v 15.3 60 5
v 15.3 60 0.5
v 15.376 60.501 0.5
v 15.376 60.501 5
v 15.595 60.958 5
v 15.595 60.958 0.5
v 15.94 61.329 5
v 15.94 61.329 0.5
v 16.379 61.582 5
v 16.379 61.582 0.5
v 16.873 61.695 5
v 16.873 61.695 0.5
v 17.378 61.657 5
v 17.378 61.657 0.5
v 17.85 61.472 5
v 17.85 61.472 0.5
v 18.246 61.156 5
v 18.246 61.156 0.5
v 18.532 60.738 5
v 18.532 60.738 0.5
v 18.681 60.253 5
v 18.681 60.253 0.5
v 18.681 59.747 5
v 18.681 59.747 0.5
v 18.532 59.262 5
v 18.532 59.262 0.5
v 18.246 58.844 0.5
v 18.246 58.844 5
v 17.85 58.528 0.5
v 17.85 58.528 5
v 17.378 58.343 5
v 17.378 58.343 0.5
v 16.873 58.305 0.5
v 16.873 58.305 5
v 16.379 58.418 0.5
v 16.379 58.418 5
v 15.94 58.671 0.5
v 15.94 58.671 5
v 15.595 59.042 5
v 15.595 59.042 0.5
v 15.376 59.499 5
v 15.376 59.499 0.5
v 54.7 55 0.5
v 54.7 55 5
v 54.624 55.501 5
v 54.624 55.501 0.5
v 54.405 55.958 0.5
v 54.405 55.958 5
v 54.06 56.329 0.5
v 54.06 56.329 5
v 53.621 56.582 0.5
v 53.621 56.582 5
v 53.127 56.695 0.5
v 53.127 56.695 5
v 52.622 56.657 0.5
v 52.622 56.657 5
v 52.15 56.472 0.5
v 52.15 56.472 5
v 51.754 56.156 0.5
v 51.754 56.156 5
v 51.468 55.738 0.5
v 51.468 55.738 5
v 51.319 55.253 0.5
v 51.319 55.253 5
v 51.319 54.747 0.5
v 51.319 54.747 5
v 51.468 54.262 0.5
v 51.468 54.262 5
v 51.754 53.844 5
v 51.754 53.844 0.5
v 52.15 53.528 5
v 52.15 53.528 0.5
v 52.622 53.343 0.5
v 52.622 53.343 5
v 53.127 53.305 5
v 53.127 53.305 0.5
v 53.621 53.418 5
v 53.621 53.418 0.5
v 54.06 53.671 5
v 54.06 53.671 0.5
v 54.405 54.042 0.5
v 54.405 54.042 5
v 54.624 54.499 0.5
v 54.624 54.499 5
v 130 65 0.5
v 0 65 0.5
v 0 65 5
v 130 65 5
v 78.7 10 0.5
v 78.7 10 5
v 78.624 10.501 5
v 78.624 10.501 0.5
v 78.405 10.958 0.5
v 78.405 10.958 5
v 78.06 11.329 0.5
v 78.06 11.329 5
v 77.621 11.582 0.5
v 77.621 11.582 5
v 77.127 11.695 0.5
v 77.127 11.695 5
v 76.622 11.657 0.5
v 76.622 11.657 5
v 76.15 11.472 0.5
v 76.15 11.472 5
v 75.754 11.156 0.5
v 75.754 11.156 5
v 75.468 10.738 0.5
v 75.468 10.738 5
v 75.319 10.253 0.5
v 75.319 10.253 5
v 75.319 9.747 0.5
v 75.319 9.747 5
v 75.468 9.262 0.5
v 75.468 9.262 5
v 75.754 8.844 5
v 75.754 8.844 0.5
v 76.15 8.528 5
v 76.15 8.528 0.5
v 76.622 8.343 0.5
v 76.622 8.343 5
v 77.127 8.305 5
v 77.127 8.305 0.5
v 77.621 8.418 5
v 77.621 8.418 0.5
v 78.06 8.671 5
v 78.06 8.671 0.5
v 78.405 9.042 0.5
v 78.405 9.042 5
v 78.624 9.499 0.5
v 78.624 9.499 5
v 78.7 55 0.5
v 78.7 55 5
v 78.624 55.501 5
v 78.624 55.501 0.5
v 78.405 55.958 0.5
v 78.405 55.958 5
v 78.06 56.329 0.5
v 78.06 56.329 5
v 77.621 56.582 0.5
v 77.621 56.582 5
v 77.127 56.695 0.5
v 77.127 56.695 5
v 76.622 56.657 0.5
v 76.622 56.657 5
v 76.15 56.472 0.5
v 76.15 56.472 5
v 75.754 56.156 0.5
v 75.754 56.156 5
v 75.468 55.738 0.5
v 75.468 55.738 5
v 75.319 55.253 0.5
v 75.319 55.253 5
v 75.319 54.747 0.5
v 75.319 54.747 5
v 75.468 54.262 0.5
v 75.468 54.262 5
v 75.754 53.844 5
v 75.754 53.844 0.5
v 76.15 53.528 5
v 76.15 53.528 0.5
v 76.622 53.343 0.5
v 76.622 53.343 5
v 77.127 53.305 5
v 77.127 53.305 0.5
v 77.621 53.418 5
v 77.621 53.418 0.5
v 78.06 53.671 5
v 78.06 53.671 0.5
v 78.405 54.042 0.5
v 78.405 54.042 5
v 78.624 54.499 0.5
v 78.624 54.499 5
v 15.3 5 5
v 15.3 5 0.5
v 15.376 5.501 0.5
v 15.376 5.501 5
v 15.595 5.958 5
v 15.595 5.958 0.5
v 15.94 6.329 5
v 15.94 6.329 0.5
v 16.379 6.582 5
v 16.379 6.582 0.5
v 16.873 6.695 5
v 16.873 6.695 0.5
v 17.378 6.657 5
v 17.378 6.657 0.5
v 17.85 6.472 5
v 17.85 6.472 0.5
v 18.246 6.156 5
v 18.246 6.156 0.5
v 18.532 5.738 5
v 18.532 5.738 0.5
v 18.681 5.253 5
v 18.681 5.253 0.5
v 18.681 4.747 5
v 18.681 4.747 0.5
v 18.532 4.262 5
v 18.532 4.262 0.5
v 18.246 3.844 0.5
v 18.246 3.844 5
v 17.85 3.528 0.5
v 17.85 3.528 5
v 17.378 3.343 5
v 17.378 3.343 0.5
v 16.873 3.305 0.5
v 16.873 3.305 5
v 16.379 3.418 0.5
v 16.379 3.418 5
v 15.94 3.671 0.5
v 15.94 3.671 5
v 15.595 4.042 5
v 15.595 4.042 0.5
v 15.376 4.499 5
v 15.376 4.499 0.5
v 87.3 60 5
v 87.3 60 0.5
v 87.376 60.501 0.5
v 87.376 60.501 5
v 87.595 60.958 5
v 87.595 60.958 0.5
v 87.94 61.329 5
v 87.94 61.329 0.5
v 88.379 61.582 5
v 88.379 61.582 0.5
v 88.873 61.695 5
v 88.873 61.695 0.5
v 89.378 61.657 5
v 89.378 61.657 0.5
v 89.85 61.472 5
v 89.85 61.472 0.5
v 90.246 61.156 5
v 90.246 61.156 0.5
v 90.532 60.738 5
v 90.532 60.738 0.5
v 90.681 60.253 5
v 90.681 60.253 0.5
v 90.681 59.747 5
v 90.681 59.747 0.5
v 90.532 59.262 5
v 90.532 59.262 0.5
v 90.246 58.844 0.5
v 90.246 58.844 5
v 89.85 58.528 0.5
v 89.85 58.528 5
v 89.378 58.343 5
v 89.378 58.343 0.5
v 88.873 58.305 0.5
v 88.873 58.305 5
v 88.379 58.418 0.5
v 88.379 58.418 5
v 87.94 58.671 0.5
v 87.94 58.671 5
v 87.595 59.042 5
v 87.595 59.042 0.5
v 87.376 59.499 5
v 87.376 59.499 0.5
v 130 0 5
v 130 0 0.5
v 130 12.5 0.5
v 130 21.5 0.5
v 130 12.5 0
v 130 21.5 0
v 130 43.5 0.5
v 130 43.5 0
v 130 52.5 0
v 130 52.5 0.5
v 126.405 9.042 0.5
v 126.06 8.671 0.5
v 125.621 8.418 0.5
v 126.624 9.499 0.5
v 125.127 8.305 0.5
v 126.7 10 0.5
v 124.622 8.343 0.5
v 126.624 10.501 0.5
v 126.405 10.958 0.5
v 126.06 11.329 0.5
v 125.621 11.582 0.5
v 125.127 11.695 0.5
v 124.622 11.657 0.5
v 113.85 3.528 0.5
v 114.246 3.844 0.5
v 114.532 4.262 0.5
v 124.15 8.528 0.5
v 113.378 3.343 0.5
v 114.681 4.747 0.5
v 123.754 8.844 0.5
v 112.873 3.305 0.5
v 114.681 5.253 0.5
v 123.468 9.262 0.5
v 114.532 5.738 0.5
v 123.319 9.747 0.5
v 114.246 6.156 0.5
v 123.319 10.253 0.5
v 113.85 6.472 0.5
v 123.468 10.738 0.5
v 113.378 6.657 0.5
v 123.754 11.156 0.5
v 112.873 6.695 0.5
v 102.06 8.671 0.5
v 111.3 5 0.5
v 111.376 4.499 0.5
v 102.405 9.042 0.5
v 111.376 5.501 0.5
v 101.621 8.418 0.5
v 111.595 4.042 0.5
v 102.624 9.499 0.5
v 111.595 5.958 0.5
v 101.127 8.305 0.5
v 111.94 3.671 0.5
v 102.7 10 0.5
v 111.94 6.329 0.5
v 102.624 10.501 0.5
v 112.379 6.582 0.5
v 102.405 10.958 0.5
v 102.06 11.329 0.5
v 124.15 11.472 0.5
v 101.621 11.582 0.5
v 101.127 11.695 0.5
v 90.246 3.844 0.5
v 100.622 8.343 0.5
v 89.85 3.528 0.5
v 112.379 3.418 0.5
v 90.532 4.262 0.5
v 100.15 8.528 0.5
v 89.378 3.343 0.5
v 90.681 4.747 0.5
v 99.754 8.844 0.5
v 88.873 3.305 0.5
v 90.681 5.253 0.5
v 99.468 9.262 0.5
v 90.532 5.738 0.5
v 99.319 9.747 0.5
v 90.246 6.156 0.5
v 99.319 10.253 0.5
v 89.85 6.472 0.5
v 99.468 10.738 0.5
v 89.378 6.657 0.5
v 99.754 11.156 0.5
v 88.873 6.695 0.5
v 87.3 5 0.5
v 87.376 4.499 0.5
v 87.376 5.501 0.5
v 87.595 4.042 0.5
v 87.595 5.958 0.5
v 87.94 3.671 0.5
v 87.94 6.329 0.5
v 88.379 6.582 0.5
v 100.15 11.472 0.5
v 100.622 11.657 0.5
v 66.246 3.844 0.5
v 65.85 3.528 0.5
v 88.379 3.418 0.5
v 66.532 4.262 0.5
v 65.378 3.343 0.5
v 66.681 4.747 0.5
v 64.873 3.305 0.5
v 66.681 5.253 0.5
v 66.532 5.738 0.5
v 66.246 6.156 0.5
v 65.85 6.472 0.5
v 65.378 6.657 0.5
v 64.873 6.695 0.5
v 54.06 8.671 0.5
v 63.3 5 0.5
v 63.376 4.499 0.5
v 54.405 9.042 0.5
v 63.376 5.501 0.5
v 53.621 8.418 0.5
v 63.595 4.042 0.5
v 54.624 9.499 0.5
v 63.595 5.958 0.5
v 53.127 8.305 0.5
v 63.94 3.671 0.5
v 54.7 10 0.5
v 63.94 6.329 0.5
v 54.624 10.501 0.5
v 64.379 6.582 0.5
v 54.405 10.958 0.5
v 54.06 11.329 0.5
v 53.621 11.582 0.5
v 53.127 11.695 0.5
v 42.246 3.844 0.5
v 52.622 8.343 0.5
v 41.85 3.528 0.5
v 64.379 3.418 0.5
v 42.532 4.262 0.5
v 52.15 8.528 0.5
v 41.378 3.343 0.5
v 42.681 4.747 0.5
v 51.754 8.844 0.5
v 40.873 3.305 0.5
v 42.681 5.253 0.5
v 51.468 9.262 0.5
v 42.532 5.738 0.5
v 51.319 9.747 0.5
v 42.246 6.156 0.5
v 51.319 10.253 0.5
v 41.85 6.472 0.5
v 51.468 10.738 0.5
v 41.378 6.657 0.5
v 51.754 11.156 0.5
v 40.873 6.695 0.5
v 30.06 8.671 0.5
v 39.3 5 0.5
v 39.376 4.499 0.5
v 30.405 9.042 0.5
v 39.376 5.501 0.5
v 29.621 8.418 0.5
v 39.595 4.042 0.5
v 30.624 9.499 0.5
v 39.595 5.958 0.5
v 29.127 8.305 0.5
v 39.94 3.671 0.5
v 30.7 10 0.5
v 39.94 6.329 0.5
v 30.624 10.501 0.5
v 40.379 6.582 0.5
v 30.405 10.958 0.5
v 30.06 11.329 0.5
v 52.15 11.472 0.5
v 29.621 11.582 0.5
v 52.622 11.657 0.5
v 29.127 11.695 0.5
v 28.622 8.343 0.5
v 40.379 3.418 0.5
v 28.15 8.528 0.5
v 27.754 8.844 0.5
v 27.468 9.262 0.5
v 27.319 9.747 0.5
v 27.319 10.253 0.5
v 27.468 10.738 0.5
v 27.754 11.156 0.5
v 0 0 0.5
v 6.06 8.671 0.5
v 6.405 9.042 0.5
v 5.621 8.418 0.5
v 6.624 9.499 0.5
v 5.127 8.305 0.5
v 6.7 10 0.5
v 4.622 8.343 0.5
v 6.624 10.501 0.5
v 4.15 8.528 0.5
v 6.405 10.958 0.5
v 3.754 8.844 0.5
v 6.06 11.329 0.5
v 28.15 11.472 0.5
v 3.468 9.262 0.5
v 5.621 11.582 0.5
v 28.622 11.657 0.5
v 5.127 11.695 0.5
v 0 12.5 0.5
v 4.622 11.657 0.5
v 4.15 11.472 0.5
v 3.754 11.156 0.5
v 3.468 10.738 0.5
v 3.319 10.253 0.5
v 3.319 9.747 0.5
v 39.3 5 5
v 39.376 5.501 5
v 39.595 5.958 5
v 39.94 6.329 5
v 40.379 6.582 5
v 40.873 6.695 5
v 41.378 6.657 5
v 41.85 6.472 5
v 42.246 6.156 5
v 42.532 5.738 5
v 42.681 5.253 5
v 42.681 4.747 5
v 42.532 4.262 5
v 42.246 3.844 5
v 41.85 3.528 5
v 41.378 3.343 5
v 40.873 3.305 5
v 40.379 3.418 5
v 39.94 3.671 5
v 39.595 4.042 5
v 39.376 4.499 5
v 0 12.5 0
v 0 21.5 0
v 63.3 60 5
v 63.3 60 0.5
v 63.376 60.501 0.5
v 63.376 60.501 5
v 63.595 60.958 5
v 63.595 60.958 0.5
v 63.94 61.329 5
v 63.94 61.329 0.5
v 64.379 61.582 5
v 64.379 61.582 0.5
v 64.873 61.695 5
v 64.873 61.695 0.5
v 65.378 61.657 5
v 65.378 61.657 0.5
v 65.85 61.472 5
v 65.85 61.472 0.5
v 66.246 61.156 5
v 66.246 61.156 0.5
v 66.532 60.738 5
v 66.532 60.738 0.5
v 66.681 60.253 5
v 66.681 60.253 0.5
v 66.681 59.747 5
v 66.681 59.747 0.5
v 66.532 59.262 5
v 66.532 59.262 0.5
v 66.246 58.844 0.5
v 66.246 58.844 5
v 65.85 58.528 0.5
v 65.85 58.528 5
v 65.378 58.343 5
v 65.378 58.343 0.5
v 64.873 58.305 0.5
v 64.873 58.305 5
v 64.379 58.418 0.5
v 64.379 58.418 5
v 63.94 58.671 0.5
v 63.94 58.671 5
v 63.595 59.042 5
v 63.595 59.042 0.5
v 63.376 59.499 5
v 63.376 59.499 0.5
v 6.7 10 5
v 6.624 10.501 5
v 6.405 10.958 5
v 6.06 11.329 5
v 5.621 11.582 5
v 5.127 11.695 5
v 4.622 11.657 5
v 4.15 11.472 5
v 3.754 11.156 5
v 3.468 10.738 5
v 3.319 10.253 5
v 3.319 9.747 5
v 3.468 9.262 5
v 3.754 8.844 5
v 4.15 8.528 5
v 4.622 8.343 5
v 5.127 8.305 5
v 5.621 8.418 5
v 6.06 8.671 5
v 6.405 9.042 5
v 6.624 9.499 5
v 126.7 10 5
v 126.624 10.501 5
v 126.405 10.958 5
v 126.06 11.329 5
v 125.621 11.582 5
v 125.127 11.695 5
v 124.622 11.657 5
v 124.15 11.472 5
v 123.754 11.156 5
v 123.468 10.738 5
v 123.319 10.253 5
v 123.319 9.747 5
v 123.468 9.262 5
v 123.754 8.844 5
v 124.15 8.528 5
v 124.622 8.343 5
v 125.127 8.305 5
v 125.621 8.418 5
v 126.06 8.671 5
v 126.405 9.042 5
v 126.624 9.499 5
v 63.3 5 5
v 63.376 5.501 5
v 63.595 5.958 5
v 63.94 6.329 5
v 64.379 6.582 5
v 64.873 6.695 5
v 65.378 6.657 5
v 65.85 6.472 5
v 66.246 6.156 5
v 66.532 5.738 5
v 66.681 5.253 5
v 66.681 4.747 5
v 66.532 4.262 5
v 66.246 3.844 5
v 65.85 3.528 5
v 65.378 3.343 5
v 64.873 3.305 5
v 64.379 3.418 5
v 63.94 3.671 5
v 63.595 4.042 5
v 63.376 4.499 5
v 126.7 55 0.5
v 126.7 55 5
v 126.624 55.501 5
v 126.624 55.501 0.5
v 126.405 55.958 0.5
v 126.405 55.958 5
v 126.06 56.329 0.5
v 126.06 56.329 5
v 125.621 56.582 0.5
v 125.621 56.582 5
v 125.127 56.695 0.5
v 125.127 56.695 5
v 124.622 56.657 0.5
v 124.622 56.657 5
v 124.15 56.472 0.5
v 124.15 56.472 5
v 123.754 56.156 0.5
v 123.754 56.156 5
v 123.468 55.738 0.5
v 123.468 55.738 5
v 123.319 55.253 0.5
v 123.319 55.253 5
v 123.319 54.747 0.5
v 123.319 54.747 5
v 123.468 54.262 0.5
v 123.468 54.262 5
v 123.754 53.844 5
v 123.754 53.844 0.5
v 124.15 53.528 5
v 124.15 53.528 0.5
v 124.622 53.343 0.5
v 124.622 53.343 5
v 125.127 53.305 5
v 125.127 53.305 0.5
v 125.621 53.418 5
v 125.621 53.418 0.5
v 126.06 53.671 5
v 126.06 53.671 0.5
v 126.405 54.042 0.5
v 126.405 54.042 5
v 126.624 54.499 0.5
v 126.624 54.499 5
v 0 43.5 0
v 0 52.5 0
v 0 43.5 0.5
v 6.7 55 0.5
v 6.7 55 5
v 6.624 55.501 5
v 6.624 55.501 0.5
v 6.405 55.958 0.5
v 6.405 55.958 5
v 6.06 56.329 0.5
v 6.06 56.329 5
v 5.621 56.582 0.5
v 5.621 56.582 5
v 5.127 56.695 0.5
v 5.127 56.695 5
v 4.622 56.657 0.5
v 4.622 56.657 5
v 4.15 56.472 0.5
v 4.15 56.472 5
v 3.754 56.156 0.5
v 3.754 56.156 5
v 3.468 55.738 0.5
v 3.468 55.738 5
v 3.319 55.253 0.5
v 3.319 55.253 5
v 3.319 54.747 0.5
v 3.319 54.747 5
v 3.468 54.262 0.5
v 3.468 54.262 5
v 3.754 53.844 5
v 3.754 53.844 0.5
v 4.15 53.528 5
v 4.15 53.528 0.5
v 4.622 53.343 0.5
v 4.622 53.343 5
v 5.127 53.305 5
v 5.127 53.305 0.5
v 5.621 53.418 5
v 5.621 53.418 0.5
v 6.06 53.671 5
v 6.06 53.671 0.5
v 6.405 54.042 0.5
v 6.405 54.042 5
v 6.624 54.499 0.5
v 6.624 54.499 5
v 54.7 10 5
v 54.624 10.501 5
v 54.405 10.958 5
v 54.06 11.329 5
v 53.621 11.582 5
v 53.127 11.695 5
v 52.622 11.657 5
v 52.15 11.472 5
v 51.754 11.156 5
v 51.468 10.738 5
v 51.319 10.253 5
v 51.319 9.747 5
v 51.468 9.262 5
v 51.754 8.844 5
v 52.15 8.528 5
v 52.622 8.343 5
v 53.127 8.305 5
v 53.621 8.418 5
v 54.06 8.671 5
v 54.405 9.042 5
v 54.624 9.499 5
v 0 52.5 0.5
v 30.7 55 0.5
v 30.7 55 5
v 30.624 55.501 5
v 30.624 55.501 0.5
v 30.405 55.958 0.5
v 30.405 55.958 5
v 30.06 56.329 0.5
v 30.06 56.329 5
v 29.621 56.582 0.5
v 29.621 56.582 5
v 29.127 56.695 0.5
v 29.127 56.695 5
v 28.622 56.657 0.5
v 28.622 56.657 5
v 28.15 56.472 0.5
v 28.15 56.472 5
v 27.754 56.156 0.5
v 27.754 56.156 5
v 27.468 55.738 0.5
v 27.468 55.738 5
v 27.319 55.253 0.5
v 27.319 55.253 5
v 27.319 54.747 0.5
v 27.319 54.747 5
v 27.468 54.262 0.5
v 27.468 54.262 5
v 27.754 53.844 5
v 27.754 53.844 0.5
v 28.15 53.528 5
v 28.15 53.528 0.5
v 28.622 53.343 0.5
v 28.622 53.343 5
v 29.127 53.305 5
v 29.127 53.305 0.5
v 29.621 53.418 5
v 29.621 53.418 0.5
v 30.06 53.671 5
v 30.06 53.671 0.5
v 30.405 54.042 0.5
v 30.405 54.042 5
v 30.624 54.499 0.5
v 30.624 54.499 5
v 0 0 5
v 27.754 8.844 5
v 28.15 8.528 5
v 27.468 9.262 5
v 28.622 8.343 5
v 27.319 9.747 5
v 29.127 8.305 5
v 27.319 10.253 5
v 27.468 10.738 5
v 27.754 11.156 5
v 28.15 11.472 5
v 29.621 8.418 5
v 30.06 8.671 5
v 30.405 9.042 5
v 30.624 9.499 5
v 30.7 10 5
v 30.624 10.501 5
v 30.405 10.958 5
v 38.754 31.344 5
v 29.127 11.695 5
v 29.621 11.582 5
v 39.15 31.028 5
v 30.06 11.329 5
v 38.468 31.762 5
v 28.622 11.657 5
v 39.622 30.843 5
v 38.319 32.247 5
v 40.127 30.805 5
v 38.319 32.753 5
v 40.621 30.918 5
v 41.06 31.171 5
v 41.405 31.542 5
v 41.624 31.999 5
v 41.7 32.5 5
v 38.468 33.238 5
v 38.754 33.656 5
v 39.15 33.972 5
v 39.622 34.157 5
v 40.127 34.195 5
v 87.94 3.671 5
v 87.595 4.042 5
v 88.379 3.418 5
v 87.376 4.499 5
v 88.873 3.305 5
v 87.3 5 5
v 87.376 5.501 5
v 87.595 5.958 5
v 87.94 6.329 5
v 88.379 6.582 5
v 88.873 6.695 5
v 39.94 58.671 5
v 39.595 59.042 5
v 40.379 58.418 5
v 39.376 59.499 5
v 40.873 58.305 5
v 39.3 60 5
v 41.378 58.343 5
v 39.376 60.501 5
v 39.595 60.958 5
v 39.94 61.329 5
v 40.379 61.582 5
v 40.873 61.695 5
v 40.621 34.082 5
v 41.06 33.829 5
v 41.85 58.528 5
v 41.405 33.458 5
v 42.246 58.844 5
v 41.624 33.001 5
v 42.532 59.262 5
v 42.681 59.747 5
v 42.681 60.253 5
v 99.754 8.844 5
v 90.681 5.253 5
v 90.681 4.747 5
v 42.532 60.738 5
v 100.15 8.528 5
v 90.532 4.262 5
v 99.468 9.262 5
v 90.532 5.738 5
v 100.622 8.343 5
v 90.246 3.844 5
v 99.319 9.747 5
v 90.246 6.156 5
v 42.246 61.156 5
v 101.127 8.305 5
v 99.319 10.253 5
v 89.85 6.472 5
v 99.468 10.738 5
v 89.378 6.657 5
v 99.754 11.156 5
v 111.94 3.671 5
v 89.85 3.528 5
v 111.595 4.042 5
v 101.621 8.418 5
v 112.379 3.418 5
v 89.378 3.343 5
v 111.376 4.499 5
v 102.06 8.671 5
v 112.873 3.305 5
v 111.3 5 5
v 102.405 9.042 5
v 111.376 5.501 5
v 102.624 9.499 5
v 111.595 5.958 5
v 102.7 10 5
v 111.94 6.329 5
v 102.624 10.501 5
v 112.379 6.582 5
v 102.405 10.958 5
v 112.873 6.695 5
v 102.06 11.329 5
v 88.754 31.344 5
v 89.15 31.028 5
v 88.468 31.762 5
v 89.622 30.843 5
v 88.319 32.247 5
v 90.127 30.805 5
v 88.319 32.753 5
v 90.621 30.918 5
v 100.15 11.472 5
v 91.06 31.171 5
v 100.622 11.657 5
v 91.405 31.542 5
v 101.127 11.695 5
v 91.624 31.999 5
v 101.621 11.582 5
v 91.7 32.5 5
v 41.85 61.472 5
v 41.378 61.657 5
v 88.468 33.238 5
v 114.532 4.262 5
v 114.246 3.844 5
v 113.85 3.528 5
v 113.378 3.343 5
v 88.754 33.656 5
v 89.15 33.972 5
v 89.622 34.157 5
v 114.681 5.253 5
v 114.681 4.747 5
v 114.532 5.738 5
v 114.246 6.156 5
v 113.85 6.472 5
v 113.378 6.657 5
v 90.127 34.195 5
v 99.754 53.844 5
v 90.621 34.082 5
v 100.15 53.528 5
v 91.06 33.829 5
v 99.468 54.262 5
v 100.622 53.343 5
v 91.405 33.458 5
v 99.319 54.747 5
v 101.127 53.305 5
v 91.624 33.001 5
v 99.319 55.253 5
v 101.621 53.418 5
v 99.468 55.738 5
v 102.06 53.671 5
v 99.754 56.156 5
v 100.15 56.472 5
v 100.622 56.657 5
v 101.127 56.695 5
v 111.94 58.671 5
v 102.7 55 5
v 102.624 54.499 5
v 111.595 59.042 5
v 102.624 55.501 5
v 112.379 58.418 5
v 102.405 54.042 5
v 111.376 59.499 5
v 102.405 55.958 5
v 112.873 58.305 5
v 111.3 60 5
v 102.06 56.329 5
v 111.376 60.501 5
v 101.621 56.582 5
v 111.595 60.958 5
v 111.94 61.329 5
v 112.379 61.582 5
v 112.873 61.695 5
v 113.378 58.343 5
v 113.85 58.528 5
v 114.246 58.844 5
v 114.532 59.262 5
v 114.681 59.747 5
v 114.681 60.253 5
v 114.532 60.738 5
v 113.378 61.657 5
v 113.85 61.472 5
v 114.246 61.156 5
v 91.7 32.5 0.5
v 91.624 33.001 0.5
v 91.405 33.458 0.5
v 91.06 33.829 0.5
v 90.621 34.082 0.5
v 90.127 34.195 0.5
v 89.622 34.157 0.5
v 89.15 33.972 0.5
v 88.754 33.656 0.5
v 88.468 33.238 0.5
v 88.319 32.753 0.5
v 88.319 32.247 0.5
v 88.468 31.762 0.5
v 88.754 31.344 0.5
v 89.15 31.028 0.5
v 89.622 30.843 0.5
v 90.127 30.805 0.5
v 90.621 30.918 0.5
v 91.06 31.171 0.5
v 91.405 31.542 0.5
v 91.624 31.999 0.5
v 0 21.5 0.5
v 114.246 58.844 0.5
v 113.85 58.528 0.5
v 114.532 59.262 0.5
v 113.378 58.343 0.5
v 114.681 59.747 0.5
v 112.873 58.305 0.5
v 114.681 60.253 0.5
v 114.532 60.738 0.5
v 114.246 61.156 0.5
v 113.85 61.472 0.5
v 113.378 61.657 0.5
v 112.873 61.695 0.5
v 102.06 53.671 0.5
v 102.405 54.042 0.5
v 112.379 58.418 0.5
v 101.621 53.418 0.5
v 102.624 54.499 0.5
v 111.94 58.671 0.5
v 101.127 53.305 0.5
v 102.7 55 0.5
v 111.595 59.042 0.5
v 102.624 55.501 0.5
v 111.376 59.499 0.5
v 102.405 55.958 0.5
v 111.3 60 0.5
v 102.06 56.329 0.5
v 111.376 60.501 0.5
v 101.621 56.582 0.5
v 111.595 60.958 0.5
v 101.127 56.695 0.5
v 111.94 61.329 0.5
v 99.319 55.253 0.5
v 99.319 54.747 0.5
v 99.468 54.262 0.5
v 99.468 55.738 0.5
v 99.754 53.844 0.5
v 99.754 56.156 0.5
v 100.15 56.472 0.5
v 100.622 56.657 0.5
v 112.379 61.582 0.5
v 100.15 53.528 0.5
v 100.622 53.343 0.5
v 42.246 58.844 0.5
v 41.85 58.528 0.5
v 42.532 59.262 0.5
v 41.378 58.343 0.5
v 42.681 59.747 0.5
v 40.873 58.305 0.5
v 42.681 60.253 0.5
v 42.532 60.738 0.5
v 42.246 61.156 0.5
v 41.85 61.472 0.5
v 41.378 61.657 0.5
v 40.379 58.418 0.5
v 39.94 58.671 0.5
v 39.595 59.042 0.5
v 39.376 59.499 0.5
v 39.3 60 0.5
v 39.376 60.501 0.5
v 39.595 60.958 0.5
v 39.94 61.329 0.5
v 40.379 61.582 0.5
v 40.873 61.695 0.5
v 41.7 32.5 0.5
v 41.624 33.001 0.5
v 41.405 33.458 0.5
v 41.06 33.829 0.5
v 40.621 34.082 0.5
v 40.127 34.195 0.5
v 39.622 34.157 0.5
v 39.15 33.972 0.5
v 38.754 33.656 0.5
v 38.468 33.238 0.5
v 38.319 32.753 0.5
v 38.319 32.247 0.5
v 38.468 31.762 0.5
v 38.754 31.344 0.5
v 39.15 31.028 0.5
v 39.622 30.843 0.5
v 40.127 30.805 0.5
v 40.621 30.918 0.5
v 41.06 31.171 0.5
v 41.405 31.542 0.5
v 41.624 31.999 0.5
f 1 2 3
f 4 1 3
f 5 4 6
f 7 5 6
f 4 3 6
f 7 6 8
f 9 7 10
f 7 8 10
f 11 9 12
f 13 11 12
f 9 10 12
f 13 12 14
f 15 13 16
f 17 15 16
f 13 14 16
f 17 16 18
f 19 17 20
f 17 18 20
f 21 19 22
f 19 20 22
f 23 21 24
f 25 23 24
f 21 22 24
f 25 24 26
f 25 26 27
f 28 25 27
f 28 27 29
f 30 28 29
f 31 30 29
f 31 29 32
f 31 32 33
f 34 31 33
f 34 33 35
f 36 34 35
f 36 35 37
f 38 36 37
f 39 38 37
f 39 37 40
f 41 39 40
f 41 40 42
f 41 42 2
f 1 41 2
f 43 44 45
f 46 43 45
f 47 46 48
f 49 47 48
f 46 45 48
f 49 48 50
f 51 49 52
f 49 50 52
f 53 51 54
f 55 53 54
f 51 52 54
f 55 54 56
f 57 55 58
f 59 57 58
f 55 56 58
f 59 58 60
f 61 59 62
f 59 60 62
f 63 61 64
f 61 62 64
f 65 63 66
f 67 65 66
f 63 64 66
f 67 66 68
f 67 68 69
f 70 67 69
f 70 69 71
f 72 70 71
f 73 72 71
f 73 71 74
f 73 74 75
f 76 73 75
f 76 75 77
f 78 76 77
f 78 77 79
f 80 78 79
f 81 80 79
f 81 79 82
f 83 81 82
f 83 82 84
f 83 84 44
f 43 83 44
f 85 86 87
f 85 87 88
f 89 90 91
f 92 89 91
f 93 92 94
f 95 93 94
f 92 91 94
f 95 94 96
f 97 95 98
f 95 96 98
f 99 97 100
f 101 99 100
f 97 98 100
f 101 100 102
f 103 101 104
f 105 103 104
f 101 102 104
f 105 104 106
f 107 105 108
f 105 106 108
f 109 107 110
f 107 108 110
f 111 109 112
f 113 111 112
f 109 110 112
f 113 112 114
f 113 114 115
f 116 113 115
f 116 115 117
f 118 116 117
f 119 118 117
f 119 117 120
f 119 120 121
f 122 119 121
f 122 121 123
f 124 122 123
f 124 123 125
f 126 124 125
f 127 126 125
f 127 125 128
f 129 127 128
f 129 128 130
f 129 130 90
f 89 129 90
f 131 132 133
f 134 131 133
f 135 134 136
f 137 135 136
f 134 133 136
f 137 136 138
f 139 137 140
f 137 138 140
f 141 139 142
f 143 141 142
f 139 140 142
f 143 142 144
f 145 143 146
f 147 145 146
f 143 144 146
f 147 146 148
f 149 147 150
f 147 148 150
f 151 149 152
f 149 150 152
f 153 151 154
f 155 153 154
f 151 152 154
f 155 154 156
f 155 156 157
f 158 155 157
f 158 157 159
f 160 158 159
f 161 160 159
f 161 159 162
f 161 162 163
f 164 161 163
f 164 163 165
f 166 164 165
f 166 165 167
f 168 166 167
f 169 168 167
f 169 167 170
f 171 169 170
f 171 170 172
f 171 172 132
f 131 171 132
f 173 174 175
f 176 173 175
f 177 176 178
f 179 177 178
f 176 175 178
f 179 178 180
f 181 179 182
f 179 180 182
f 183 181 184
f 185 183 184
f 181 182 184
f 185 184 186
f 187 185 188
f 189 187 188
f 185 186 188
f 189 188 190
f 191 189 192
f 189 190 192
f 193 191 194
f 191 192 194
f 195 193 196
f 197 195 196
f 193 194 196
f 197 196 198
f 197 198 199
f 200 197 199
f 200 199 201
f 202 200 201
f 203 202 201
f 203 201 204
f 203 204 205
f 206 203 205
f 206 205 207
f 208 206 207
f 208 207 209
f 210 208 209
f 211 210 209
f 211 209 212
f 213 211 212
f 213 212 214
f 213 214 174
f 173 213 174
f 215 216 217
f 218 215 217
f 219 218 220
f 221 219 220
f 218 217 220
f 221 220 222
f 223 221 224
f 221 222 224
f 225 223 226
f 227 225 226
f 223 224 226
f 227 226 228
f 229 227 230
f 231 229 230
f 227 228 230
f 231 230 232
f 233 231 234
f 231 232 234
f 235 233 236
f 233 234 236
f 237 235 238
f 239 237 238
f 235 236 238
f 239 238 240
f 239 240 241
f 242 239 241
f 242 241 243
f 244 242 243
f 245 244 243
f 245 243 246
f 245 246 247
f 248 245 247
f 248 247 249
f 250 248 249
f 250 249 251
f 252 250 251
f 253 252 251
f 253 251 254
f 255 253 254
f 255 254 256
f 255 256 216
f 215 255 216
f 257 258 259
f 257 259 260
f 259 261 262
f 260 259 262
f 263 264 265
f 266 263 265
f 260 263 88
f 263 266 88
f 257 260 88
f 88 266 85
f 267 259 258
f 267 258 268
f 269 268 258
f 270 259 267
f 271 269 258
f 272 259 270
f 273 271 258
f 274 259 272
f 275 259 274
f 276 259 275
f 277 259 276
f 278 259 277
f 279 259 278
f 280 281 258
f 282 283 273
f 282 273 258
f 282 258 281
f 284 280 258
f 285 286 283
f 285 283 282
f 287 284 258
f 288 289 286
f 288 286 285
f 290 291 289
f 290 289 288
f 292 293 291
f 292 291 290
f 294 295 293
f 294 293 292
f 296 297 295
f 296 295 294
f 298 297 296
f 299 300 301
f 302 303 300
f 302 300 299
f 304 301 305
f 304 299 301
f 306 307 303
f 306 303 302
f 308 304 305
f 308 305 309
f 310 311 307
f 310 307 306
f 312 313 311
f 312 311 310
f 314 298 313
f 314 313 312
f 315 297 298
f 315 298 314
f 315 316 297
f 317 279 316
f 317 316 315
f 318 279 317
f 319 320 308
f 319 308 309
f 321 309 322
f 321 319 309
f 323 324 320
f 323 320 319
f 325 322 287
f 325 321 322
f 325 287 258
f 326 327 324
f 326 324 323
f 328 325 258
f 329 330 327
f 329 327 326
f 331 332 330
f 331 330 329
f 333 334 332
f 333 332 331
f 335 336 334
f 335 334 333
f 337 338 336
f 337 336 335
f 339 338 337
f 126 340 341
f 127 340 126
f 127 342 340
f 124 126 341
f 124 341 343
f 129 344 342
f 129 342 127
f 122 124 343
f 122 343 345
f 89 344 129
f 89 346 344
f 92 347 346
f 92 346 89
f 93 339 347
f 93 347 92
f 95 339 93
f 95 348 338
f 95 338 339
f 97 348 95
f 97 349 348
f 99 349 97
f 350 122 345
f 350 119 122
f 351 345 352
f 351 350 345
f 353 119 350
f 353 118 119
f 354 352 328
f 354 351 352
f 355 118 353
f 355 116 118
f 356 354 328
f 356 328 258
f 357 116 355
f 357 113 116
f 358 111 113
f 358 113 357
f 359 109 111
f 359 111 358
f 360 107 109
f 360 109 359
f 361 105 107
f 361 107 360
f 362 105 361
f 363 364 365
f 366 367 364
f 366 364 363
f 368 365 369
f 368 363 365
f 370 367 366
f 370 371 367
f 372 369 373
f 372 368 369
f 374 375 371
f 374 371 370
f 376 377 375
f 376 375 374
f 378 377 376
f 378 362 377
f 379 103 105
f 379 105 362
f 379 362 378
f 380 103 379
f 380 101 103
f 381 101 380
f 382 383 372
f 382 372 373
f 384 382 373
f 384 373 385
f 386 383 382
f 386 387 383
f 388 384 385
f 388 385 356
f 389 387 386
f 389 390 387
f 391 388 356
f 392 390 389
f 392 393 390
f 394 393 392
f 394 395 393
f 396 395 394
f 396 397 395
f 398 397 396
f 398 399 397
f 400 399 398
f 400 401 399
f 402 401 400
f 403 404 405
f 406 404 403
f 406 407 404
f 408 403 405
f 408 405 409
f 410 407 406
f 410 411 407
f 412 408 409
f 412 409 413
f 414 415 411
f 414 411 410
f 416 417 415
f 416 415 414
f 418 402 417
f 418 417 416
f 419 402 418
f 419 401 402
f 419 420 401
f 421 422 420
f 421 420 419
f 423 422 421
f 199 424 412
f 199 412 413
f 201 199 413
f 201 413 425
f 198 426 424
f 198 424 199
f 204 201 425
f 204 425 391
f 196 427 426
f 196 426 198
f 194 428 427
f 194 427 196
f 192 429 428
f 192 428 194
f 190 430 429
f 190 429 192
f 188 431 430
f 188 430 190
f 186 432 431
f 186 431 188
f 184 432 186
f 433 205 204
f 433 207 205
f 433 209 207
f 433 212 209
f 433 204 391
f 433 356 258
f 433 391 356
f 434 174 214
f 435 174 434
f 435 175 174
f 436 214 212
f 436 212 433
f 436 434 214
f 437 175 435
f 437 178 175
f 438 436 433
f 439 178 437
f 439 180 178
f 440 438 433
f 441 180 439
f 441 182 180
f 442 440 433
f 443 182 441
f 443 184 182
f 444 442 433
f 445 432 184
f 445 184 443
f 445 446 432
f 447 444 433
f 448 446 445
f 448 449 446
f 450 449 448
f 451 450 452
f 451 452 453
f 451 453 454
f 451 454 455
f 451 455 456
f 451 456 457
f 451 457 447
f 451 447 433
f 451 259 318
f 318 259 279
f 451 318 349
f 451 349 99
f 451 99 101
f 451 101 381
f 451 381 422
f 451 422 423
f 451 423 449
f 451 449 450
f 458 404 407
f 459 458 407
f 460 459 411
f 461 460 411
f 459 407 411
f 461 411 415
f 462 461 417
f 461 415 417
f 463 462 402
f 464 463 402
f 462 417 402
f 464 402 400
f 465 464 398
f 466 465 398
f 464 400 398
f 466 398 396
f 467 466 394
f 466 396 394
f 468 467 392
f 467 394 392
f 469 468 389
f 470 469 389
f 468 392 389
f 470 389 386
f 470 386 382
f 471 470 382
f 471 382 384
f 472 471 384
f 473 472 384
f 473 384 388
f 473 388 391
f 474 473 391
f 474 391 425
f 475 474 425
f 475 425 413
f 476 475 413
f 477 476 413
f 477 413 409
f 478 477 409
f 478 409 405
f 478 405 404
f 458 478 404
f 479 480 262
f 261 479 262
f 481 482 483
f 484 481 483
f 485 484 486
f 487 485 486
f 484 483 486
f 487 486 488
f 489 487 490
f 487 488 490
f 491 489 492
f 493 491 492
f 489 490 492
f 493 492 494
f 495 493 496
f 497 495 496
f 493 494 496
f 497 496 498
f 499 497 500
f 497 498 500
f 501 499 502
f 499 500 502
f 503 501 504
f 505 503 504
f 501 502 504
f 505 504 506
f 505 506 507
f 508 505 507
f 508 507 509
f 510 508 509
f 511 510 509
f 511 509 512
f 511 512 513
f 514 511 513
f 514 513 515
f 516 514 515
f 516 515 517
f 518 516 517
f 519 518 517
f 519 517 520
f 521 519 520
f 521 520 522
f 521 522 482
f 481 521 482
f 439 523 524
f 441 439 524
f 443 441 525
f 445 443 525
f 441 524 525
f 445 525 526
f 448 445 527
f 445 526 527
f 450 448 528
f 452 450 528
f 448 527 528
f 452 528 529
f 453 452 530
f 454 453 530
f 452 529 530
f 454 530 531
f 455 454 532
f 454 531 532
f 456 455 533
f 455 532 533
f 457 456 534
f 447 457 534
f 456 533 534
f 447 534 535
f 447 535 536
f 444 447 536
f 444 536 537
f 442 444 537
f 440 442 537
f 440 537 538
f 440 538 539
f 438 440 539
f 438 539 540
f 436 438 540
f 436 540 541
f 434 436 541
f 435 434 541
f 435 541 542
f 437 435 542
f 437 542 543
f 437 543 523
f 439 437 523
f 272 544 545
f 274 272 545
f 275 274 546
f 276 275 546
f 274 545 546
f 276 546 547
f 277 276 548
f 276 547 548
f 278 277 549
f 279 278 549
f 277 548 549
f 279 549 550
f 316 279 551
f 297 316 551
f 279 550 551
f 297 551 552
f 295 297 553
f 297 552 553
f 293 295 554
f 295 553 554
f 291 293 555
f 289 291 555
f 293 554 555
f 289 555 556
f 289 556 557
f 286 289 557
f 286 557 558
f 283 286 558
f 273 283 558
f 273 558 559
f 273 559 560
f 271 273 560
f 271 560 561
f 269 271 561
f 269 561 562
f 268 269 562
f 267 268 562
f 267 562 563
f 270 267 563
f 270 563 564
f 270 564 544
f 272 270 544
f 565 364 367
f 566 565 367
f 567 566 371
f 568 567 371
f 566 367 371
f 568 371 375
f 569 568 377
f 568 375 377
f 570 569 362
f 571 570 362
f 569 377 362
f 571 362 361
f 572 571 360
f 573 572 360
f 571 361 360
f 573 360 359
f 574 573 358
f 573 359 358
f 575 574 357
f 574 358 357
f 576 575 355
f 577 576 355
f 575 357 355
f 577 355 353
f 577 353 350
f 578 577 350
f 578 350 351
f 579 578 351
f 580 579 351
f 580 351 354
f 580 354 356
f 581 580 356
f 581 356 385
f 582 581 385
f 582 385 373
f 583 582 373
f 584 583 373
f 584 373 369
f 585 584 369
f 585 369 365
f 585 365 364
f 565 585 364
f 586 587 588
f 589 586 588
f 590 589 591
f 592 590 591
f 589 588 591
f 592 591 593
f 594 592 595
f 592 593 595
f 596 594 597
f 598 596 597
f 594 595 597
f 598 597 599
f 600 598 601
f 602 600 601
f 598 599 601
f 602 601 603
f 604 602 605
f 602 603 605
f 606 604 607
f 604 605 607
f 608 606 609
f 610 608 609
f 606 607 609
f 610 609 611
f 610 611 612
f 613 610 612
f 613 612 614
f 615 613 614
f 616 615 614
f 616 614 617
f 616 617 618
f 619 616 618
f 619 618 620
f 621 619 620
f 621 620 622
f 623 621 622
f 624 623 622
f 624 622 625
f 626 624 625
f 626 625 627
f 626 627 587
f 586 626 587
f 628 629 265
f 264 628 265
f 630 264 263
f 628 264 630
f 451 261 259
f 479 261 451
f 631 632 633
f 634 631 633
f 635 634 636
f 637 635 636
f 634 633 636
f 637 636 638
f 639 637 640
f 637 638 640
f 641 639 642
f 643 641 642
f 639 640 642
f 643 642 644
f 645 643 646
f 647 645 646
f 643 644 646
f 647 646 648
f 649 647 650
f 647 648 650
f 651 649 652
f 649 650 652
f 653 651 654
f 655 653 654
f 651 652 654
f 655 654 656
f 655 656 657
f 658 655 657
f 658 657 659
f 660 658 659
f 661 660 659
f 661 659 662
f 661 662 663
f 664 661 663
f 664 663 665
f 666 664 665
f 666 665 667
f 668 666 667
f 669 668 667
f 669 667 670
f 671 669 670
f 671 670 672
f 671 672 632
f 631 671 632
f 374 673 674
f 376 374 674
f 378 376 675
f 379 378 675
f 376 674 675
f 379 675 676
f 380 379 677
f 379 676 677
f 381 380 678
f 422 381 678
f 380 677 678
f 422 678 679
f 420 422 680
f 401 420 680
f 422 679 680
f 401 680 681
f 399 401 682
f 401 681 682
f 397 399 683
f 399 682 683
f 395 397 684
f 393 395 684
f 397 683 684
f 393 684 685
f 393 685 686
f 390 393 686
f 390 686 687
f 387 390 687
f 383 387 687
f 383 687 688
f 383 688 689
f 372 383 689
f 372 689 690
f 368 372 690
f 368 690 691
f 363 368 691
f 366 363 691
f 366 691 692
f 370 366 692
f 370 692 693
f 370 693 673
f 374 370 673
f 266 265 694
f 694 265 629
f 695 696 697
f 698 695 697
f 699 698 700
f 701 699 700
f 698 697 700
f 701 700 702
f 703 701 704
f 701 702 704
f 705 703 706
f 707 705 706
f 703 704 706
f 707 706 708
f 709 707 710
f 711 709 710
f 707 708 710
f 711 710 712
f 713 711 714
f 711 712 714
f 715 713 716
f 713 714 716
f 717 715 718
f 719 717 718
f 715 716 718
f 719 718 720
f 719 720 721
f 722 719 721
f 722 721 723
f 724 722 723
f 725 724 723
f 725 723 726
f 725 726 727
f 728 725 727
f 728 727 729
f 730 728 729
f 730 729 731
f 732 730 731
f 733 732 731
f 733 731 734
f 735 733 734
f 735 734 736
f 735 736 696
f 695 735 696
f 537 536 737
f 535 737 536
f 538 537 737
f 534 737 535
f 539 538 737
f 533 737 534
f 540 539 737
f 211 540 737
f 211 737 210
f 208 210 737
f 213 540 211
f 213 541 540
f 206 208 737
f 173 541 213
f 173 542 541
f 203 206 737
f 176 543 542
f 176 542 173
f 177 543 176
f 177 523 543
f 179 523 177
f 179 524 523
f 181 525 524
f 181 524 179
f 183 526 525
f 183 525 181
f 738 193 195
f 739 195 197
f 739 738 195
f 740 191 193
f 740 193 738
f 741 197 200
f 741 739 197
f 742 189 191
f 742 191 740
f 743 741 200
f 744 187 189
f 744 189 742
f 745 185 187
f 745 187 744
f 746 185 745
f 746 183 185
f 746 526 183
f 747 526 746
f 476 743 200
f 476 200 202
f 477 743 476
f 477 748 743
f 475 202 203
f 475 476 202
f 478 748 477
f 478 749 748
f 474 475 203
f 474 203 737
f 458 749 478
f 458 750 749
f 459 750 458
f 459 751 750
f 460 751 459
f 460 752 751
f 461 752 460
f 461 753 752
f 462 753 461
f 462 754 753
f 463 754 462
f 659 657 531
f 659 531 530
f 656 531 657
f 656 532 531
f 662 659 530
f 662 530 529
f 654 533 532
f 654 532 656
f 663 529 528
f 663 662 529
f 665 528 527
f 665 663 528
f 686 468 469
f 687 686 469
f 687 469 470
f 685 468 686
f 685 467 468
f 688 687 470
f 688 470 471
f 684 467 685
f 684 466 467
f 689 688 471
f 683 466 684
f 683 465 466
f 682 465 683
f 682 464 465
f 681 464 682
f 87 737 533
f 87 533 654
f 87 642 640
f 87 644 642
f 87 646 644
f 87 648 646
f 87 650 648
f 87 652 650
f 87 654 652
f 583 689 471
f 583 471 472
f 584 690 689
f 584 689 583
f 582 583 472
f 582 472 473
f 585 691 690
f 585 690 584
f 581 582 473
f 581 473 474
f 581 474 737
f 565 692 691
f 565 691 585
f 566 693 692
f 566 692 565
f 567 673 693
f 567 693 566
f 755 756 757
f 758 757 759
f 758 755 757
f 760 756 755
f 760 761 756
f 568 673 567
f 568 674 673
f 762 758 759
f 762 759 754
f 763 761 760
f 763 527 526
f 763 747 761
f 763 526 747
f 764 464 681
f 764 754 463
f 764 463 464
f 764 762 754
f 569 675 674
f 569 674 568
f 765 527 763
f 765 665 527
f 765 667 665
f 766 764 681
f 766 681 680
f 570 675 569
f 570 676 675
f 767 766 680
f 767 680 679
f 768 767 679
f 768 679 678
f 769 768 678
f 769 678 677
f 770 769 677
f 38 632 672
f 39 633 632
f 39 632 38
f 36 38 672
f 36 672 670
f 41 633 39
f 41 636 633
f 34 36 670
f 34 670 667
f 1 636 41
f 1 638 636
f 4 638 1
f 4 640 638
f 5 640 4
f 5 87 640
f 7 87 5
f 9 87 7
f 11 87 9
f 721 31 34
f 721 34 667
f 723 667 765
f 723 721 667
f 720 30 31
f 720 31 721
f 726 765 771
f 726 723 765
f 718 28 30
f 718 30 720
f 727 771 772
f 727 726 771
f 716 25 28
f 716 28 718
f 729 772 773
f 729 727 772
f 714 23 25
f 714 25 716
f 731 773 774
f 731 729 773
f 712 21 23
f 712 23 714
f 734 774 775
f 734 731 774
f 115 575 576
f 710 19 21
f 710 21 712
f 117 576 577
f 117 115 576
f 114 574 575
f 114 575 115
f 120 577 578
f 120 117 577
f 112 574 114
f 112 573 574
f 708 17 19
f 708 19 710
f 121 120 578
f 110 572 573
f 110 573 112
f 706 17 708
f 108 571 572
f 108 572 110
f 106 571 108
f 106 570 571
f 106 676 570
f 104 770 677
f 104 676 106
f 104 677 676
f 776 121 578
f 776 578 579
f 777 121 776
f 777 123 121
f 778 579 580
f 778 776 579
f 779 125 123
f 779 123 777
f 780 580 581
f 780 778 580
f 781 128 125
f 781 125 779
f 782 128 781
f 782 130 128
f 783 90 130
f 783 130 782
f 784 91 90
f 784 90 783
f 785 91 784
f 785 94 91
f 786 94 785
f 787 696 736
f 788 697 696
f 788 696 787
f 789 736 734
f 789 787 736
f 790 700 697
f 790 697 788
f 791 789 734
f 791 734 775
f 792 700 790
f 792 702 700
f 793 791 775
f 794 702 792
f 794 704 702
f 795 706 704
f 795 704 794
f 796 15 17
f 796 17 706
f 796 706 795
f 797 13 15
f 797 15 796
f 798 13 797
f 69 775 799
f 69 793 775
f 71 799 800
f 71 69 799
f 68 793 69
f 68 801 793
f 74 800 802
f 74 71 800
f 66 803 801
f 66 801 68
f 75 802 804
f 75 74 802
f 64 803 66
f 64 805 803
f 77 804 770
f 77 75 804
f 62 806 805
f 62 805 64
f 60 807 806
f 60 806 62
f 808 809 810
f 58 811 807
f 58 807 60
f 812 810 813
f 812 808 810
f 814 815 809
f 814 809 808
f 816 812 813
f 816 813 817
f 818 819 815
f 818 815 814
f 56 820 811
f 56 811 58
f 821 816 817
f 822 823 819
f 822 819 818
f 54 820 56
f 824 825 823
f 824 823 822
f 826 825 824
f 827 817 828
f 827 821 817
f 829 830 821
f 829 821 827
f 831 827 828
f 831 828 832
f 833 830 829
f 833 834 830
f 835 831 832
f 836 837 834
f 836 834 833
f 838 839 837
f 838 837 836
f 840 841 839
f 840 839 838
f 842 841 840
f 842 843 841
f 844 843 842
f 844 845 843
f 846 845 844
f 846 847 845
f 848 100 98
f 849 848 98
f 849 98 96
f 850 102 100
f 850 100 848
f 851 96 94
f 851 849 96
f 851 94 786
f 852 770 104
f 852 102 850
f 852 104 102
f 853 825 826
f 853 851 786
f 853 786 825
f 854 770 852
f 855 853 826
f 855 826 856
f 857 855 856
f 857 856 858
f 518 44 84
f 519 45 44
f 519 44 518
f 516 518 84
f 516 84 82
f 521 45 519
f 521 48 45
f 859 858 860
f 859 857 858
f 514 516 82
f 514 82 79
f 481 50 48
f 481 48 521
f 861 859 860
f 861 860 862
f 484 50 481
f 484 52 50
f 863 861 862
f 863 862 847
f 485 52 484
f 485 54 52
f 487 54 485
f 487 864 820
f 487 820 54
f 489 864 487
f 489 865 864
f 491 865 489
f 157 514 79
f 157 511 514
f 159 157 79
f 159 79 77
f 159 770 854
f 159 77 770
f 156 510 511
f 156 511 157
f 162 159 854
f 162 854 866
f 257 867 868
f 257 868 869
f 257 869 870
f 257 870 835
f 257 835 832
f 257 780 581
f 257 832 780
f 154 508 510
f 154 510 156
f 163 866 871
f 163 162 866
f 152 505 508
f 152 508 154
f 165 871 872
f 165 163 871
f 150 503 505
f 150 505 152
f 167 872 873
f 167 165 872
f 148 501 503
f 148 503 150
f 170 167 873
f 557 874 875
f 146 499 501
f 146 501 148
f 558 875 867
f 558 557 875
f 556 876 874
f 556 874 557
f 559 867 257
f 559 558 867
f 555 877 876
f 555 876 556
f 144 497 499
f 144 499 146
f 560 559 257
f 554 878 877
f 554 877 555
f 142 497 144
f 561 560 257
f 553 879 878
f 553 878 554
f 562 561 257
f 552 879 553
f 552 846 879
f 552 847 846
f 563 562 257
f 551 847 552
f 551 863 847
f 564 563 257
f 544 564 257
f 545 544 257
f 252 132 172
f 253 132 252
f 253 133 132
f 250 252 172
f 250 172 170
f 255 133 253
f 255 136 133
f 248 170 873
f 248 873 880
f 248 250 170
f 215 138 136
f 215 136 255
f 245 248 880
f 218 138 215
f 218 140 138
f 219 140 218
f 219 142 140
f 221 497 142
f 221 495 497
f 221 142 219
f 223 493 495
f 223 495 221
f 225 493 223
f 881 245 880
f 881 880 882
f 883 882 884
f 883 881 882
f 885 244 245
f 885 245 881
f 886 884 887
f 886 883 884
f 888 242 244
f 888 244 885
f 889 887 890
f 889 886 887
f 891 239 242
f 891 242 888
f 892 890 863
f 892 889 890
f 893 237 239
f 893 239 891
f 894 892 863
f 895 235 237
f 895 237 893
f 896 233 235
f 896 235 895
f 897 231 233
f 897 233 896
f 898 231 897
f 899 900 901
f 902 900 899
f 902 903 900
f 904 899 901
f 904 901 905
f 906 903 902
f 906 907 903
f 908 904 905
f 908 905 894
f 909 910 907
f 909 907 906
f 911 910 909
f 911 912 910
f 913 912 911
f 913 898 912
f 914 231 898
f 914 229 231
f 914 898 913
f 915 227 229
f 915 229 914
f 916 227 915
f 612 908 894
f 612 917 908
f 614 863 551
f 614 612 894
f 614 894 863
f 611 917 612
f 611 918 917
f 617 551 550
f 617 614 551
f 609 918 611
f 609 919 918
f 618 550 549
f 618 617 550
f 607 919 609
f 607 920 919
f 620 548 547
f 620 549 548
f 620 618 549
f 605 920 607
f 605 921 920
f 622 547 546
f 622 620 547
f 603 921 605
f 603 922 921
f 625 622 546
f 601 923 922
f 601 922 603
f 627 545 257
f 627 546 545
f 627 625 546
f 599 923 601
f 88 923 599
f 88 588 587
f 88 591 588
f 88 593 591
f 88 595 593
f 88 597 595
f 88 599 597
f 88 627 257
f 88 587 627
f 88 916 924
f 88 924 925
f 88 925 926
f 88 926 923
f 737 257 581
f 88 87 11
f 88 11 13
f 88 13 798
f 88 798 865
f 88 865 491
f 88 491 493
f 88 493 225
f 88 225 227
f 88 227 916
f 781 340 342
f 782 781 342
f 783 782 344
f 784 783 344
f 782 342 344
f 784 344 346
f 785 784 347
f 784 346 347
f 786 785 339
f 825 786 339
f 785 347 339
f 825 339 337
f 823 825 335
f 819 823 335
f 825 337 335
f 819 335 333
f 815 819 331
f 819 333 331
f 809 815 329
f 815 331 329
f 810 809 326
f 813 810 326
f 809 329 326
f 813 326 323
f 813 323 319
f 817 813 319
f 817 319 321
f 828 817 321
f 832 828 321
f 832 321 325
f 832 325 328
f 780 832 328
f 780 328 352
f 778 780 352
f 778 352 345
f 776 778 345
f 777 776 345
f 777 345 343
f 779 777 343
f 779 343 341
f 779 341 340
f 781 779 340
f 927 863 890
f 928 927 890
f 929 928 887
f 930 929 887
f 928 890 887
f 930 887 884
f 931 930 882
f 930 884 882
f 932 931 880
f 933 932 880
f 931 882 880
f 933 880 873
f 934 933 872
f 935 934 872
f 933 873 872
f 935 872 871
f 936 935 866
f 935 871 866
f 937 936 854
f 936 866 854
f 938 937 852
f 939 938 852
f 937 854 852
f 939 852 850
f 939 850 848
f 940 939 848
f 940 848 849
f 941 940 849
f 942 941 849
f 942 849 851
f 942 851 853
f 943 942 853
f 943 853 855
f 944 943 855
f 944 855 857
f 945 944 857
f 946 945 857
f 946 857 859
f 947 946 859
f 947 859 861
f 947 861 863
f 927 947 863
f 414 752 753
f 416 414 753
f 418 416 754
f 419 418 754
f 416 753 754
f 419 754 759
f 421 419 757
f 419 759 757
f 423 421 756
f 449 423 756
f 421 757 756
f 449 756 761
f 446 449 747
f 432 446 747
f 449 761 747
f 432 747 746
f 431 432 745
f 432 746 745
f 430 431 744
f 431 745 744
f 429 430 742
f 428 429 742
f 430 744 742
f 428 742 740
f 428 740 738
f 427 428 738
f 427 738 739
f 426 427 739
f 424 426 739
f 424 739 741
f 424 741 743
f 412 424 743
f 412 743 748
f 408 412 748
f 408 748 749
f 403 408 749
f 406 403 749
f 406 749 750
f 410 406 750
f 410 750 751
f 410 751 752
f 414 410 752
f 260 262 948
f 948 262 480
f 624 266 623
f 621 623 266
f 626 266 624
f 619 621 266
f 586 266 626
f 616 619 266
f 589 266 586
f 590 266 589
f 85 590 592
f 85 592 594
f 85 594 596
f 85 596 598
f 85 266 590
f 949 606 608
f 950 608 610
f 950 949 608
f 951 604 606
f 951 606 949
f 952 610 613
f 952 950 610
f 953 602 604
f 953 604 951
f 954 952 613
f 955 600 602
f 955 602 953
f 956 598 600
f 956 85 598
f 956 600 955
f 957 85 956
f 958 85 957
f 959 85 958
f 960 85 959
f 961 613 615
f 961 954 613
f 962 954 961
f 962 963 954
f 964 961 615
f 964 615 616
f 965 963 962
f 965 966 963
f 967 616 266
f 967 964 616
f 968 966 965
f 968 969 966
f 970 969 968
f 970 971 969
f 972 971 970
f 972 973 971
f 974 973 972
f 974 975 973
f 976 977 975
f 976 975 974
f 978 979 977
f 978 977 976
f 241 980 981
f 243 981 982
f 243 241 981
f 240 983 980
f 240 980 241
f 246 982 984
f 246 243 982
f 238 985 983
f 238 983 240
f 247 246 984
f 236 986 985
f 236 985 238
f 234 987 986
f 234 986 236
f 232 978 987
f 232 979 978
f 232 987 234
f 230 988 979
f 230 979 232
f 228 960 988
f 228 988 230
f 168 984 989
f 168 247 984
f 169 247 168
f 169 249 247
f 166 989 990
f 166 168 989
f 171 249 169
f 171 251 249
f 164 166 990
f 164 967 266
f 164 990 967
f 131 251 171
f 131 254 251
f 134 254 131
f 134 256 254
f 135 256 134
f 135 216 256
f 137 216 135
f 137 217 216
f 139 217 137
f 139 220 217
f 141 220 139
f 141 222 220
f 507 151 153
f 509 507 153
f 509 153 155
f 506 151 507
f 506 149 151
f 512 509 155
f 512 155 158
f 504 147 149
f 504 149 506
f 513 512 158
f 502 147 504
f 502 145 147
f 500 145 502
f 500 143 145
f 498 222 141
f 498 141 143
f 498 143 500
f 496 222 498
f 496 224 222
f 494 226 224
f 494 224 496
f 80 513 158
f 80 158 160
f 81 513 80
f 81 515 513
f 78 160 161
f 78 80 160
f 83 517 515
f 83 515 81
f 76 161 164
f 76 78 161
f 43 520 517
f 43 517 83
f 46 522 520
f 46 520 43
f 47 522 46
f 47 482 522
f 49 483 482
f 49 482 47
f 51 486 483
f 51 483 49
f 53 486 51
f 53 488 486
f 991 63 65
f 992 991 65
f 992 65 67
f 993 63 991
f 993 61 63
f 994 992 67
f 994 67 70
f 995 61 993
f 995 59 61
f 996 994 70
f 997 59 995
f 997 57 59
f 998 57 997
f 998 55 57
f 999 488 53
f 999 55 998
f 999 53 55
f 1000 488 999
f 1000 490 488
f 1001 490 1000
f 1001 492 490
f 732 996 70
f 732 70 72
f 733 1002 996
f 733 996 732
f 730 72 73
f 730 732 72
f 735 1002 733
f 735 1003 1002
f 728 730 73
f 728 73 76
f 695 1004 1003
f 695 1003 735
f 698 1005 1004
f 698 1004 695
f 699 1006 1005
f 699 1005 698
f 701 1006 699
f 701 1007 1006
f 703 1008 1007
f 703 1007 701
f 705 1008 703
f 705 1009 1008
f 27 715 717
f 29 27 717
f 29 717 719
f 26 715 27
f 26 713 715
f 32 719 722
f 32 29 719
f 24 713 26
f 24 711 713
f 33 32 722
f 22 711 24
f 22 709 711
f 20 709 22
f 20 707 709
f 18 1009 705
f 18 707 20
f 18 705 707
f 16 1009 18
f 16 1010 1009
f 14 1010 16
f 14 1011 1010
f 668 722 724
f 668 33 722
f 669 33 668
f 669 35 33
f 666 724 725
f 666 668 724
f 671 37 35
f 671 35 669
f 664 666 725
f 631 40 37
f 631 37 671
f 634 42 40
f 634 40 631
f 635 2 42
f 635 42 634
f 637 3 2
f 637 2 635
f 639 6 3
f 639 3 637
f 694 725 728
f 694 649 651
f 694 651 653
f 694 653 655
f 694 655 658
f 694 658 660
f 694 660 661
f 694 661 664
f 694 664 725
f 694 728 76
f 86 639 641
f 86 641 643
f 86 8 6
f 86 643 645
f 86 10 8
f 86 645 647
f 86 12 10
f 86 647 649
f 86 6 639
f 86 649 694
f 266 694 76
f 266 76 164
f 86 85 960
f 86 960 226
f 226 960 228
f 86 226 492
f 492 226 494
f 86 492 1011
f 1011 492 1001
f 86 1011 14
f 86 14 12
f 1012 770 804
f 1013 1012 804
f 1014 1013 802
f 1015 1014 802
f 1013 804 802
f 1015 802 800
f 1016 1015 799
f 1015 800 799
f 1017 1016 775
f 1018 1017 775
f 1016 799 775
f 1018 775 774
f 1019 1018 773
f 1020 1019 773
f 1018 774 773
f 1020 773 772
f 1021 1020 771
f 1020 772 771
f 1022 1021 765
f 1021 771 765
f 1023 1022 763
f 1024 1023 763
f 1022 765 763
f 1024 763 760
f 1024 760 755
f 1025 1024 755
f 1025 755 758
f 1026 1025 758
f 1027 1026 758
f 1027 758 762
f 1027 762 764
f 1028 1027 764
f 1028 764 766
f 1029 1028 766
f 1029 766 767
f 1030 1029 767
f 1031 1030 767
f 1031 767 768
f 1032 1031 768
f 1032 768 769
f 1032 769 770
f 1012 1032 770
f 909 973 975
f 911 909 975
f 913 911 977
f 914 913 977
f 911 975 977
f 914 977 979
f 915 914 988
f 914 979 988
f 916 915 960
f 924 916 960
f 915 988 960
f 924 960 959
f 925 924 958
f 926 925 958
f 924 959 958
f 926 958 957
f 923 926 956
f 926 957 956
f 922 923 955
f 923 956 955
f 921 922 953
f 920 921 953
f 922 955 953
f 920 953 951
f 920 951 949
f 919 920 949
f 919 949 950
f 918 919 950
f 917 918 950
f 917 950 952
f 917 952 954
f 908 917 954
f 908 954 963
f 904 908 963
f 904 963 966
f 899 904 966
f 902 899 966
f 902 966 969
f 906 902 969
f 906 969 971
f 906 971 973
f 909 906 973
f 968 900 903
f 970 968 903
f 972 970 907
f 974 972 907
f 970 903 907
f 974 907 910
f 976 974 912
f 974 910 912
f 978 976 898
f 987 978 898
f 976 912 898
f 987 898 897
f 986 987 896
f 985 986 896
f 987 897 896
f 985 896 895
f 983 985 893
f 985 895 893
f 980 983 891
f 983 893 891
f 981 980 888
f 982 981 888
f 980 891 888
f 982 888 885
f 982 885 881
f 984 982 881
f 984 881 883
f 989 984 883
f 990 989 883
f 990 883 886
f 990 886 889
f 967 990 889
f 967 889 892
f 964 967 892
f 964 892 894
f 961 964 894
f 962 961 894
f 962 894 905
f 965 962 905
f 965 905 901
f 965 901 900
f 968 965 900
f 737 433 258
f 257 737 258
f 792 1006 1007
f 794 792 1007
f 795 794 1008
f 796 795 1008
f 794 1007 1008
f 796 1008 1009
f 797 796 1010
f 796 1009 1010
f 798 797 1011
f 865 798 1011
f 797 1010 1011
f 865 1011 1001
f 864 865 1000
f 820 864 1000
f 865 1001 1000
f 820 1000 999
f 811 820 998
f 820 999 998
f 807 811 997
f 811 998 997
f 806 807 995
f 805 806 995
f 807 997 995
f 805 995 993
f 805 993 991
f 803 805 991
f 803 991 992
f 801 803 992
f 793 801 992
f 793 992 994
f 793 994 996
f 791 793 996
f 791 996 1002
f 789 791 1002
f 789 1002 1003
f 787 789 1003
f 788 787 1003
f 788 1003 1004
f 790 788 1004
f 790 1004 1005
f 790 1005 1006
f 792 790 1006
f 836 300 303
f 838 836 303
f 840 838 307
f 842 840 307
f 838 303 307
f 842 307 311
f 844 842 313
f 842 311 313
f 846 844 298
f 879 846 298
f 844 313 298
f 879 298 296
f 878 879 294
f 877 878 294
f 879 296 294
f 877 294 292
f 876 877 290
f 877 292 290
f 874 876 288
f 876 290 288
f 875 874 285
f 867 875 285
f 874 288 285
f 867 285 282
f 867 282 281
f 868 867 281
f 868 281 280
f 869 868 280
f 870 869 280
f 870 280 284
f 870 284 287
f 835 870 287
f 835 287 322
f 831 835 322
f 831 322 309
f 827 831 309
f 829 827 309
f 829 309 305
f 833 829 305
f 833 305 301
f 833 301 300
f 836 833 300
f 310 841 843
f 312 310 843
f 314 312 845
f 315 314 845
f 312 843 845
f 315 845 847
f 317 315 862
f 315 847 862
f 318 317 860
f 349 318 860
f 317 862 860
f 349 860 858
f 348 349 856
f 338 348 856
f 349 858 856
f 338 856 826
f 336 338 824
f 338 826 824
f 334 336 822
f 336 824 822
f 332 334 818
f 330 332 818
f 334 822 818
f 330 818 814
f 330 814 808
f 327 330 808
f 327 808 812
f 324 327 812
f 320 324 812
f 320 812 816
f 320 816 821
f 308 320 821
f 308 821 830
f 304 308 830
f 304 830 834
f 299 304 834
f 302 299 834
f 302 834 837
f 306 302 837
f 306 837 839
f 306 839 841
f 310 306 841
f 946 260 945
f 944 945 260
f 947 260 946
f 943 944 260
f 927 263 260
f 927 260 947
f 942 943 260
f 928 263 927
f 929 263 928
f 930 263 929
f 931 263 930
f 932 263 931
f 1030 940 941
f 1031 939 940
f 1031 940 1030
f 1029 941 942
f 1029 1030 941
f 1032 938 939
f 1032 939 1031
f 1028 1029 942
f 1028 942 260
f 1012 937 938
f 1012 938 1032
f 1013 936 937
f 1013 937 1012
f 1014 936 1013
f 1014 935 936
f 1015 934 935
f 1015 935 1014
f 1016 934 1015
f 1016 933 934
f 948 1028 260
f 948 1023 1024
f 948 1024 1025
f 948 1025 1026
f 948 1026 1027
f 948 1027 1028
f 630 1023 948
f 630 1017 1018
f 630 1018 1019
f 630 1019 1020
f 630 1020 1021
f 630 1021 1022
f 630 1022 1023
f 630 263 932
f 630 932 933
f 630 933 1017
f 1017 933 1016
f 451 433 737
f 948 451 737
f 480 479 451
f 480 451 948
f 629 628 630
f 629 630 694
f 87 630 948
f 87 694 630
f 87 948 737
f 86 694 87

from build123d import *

# Parameters (mm, degrees)
ESQUISSE1_W             = 130
ESQUISSE1_H             = 65
ESQUISSE1_R             = 1.3
BOSS_EXTRU_1_DEPTH      = 5
ESQUISSE2_W             = 130
ESQUISSE2_H             = 12.5
ESQUISSE2_H_2           = 22
ENL_V_MAT_EXTRU_1_DEPTH = 0.5
D_GAGEMENT_M3_D         = 3.4
D_GAGEMENT_M3_DEPTH     = 6.978536948
D_GAGEMENT_M3_TIP       = 1.021463052
D_GAGEMENT_M32_D        = 3.4
D_GAGEMENT_M32_DEPTH    = 6.978536948
D_GAGEMENT_M32_TIP      = 1.021463052


with BuildPart() as part:
    # Esquisse1 → Boss.-Extru.1 (new body)
    with BuildSketch(Plane.XY):
        with Locations((65, 32.5)):
            Rectangle(ESQUISSE1_W, ESQUISSE1_H)
        with Locations((113, 5)):
            Circle(ESQUISSE1_R, mode=Mode.SUBTRACT)
        with Locations((89, 5)):
            Circle(ESQUISSE1_R, mode=Mode.SUBTRACT)
        with Locations((65, 5)):
            Circle(ESQUISSE1_R, mode=Mode.SUBTRACT)
        with Locations((41, 5)):
            Circle(ESQUISSE1_R, mode=Mode.SUBTRACT)
        with Locations((17, 5)):
            Circle(ESQUISSE1_R, mode=Mode.SUBTRACT)
        with Locations((113, 60)):
            Circle(ESQUISSE1_R, mode=Mode.SUBTRACT)
        with Locations((89, 60)):
            Circle(ESQUISSE1_R, mode=Mode.SUBTRACT)
        with Locations((65, 60)):
            Circle(ESQUISSE1_R, mode=Mode.SUBTRACT)
        with Locations((41, 60)):
            Circle(ESQUISSE1_R, mode=Mode.SUBTRACT)
        with Locations((17, 60)):
            Circle(ESQUISSE1_R, mode=Mode.SUBTRACT)
    extrude(amount=BOSS_EXTRU_1_DEPTH)

    # Esquisse2 → Enlèv. mat.-Extru.1 (cut)
    with BuildSketch(Plane(origin=(0, 0, 0), x_dir=(-1, 0, 0), z_dir=(0, 0, -1))):
        with Locations((-65, 58.75)):
            Rectangle(ESQUISSE2_W, ESQUISSE2_H)
        with Locations((-65, 6.25)):
            Rectangle(ESQUISSE2_W, ESQUISSE2_H)
        with Locations((-65, 32.5)):
            Rectangle(ESQUISSE2_W, ESQUISSE2_H_2)
    extrude(amount=-ENL_V_MAT_EXTRU_1_DEPTH, mode=Mode.SUBTRACT)

    # Dégagement M3
    with Locations(Plane.XY.offset(5)):
        with Locations((17, 60), (41, 60), (65, 60), (89, 60), (113, 60), (113, 5), (89, 5), (65, 5), (41, 5), (17, 5)):
            Hole(D_GAGEMENT_M3_D / 2, depth=D_GAGEMENT_M3_DEPTH)
            with Locations((0, 0, -(D_GAGEMENT_M3_DEPTH + D_GAGEMENT_M3_TIP / 2))):  # 118° drill point
                Cone(0, D_GAGEMENT_M3_D / 2, D_GAGEMENT_M3_TIP, mode=Mode.SUBTRACT)

    # Dégagement M32
    with Locations(Plane(origin=(0, 0, 0.5), x_dir=(-1, 0, 0), z_dir=(0, 0, -1))):
        with Locations((-125, 55), (-101, 55), (-77, 55), (-53, 55), (-29, 55), (-5, 55), (-40, 32.5), (-90, 32.5), (-125, 10), (-101, 10), (-77, 10), (-53, 10), (-29, 10), (-5, 10)):
            Hole(D_GAGEMENT_M32_D / 2, depth=D_GAGEMENT_M32_DEPTH)
            with Locations((0, 0, -(D_GAGEMENT_M32_DEPTH + D_GAGEMENT_M32_TIP / 2))):  # 118° drill point
                Cone(0, D_GAGEMENT_M32_D / 2, D_GAGEMENT_M32_TIP, mode=Mode.SUBTRACT)


solid = part.part
